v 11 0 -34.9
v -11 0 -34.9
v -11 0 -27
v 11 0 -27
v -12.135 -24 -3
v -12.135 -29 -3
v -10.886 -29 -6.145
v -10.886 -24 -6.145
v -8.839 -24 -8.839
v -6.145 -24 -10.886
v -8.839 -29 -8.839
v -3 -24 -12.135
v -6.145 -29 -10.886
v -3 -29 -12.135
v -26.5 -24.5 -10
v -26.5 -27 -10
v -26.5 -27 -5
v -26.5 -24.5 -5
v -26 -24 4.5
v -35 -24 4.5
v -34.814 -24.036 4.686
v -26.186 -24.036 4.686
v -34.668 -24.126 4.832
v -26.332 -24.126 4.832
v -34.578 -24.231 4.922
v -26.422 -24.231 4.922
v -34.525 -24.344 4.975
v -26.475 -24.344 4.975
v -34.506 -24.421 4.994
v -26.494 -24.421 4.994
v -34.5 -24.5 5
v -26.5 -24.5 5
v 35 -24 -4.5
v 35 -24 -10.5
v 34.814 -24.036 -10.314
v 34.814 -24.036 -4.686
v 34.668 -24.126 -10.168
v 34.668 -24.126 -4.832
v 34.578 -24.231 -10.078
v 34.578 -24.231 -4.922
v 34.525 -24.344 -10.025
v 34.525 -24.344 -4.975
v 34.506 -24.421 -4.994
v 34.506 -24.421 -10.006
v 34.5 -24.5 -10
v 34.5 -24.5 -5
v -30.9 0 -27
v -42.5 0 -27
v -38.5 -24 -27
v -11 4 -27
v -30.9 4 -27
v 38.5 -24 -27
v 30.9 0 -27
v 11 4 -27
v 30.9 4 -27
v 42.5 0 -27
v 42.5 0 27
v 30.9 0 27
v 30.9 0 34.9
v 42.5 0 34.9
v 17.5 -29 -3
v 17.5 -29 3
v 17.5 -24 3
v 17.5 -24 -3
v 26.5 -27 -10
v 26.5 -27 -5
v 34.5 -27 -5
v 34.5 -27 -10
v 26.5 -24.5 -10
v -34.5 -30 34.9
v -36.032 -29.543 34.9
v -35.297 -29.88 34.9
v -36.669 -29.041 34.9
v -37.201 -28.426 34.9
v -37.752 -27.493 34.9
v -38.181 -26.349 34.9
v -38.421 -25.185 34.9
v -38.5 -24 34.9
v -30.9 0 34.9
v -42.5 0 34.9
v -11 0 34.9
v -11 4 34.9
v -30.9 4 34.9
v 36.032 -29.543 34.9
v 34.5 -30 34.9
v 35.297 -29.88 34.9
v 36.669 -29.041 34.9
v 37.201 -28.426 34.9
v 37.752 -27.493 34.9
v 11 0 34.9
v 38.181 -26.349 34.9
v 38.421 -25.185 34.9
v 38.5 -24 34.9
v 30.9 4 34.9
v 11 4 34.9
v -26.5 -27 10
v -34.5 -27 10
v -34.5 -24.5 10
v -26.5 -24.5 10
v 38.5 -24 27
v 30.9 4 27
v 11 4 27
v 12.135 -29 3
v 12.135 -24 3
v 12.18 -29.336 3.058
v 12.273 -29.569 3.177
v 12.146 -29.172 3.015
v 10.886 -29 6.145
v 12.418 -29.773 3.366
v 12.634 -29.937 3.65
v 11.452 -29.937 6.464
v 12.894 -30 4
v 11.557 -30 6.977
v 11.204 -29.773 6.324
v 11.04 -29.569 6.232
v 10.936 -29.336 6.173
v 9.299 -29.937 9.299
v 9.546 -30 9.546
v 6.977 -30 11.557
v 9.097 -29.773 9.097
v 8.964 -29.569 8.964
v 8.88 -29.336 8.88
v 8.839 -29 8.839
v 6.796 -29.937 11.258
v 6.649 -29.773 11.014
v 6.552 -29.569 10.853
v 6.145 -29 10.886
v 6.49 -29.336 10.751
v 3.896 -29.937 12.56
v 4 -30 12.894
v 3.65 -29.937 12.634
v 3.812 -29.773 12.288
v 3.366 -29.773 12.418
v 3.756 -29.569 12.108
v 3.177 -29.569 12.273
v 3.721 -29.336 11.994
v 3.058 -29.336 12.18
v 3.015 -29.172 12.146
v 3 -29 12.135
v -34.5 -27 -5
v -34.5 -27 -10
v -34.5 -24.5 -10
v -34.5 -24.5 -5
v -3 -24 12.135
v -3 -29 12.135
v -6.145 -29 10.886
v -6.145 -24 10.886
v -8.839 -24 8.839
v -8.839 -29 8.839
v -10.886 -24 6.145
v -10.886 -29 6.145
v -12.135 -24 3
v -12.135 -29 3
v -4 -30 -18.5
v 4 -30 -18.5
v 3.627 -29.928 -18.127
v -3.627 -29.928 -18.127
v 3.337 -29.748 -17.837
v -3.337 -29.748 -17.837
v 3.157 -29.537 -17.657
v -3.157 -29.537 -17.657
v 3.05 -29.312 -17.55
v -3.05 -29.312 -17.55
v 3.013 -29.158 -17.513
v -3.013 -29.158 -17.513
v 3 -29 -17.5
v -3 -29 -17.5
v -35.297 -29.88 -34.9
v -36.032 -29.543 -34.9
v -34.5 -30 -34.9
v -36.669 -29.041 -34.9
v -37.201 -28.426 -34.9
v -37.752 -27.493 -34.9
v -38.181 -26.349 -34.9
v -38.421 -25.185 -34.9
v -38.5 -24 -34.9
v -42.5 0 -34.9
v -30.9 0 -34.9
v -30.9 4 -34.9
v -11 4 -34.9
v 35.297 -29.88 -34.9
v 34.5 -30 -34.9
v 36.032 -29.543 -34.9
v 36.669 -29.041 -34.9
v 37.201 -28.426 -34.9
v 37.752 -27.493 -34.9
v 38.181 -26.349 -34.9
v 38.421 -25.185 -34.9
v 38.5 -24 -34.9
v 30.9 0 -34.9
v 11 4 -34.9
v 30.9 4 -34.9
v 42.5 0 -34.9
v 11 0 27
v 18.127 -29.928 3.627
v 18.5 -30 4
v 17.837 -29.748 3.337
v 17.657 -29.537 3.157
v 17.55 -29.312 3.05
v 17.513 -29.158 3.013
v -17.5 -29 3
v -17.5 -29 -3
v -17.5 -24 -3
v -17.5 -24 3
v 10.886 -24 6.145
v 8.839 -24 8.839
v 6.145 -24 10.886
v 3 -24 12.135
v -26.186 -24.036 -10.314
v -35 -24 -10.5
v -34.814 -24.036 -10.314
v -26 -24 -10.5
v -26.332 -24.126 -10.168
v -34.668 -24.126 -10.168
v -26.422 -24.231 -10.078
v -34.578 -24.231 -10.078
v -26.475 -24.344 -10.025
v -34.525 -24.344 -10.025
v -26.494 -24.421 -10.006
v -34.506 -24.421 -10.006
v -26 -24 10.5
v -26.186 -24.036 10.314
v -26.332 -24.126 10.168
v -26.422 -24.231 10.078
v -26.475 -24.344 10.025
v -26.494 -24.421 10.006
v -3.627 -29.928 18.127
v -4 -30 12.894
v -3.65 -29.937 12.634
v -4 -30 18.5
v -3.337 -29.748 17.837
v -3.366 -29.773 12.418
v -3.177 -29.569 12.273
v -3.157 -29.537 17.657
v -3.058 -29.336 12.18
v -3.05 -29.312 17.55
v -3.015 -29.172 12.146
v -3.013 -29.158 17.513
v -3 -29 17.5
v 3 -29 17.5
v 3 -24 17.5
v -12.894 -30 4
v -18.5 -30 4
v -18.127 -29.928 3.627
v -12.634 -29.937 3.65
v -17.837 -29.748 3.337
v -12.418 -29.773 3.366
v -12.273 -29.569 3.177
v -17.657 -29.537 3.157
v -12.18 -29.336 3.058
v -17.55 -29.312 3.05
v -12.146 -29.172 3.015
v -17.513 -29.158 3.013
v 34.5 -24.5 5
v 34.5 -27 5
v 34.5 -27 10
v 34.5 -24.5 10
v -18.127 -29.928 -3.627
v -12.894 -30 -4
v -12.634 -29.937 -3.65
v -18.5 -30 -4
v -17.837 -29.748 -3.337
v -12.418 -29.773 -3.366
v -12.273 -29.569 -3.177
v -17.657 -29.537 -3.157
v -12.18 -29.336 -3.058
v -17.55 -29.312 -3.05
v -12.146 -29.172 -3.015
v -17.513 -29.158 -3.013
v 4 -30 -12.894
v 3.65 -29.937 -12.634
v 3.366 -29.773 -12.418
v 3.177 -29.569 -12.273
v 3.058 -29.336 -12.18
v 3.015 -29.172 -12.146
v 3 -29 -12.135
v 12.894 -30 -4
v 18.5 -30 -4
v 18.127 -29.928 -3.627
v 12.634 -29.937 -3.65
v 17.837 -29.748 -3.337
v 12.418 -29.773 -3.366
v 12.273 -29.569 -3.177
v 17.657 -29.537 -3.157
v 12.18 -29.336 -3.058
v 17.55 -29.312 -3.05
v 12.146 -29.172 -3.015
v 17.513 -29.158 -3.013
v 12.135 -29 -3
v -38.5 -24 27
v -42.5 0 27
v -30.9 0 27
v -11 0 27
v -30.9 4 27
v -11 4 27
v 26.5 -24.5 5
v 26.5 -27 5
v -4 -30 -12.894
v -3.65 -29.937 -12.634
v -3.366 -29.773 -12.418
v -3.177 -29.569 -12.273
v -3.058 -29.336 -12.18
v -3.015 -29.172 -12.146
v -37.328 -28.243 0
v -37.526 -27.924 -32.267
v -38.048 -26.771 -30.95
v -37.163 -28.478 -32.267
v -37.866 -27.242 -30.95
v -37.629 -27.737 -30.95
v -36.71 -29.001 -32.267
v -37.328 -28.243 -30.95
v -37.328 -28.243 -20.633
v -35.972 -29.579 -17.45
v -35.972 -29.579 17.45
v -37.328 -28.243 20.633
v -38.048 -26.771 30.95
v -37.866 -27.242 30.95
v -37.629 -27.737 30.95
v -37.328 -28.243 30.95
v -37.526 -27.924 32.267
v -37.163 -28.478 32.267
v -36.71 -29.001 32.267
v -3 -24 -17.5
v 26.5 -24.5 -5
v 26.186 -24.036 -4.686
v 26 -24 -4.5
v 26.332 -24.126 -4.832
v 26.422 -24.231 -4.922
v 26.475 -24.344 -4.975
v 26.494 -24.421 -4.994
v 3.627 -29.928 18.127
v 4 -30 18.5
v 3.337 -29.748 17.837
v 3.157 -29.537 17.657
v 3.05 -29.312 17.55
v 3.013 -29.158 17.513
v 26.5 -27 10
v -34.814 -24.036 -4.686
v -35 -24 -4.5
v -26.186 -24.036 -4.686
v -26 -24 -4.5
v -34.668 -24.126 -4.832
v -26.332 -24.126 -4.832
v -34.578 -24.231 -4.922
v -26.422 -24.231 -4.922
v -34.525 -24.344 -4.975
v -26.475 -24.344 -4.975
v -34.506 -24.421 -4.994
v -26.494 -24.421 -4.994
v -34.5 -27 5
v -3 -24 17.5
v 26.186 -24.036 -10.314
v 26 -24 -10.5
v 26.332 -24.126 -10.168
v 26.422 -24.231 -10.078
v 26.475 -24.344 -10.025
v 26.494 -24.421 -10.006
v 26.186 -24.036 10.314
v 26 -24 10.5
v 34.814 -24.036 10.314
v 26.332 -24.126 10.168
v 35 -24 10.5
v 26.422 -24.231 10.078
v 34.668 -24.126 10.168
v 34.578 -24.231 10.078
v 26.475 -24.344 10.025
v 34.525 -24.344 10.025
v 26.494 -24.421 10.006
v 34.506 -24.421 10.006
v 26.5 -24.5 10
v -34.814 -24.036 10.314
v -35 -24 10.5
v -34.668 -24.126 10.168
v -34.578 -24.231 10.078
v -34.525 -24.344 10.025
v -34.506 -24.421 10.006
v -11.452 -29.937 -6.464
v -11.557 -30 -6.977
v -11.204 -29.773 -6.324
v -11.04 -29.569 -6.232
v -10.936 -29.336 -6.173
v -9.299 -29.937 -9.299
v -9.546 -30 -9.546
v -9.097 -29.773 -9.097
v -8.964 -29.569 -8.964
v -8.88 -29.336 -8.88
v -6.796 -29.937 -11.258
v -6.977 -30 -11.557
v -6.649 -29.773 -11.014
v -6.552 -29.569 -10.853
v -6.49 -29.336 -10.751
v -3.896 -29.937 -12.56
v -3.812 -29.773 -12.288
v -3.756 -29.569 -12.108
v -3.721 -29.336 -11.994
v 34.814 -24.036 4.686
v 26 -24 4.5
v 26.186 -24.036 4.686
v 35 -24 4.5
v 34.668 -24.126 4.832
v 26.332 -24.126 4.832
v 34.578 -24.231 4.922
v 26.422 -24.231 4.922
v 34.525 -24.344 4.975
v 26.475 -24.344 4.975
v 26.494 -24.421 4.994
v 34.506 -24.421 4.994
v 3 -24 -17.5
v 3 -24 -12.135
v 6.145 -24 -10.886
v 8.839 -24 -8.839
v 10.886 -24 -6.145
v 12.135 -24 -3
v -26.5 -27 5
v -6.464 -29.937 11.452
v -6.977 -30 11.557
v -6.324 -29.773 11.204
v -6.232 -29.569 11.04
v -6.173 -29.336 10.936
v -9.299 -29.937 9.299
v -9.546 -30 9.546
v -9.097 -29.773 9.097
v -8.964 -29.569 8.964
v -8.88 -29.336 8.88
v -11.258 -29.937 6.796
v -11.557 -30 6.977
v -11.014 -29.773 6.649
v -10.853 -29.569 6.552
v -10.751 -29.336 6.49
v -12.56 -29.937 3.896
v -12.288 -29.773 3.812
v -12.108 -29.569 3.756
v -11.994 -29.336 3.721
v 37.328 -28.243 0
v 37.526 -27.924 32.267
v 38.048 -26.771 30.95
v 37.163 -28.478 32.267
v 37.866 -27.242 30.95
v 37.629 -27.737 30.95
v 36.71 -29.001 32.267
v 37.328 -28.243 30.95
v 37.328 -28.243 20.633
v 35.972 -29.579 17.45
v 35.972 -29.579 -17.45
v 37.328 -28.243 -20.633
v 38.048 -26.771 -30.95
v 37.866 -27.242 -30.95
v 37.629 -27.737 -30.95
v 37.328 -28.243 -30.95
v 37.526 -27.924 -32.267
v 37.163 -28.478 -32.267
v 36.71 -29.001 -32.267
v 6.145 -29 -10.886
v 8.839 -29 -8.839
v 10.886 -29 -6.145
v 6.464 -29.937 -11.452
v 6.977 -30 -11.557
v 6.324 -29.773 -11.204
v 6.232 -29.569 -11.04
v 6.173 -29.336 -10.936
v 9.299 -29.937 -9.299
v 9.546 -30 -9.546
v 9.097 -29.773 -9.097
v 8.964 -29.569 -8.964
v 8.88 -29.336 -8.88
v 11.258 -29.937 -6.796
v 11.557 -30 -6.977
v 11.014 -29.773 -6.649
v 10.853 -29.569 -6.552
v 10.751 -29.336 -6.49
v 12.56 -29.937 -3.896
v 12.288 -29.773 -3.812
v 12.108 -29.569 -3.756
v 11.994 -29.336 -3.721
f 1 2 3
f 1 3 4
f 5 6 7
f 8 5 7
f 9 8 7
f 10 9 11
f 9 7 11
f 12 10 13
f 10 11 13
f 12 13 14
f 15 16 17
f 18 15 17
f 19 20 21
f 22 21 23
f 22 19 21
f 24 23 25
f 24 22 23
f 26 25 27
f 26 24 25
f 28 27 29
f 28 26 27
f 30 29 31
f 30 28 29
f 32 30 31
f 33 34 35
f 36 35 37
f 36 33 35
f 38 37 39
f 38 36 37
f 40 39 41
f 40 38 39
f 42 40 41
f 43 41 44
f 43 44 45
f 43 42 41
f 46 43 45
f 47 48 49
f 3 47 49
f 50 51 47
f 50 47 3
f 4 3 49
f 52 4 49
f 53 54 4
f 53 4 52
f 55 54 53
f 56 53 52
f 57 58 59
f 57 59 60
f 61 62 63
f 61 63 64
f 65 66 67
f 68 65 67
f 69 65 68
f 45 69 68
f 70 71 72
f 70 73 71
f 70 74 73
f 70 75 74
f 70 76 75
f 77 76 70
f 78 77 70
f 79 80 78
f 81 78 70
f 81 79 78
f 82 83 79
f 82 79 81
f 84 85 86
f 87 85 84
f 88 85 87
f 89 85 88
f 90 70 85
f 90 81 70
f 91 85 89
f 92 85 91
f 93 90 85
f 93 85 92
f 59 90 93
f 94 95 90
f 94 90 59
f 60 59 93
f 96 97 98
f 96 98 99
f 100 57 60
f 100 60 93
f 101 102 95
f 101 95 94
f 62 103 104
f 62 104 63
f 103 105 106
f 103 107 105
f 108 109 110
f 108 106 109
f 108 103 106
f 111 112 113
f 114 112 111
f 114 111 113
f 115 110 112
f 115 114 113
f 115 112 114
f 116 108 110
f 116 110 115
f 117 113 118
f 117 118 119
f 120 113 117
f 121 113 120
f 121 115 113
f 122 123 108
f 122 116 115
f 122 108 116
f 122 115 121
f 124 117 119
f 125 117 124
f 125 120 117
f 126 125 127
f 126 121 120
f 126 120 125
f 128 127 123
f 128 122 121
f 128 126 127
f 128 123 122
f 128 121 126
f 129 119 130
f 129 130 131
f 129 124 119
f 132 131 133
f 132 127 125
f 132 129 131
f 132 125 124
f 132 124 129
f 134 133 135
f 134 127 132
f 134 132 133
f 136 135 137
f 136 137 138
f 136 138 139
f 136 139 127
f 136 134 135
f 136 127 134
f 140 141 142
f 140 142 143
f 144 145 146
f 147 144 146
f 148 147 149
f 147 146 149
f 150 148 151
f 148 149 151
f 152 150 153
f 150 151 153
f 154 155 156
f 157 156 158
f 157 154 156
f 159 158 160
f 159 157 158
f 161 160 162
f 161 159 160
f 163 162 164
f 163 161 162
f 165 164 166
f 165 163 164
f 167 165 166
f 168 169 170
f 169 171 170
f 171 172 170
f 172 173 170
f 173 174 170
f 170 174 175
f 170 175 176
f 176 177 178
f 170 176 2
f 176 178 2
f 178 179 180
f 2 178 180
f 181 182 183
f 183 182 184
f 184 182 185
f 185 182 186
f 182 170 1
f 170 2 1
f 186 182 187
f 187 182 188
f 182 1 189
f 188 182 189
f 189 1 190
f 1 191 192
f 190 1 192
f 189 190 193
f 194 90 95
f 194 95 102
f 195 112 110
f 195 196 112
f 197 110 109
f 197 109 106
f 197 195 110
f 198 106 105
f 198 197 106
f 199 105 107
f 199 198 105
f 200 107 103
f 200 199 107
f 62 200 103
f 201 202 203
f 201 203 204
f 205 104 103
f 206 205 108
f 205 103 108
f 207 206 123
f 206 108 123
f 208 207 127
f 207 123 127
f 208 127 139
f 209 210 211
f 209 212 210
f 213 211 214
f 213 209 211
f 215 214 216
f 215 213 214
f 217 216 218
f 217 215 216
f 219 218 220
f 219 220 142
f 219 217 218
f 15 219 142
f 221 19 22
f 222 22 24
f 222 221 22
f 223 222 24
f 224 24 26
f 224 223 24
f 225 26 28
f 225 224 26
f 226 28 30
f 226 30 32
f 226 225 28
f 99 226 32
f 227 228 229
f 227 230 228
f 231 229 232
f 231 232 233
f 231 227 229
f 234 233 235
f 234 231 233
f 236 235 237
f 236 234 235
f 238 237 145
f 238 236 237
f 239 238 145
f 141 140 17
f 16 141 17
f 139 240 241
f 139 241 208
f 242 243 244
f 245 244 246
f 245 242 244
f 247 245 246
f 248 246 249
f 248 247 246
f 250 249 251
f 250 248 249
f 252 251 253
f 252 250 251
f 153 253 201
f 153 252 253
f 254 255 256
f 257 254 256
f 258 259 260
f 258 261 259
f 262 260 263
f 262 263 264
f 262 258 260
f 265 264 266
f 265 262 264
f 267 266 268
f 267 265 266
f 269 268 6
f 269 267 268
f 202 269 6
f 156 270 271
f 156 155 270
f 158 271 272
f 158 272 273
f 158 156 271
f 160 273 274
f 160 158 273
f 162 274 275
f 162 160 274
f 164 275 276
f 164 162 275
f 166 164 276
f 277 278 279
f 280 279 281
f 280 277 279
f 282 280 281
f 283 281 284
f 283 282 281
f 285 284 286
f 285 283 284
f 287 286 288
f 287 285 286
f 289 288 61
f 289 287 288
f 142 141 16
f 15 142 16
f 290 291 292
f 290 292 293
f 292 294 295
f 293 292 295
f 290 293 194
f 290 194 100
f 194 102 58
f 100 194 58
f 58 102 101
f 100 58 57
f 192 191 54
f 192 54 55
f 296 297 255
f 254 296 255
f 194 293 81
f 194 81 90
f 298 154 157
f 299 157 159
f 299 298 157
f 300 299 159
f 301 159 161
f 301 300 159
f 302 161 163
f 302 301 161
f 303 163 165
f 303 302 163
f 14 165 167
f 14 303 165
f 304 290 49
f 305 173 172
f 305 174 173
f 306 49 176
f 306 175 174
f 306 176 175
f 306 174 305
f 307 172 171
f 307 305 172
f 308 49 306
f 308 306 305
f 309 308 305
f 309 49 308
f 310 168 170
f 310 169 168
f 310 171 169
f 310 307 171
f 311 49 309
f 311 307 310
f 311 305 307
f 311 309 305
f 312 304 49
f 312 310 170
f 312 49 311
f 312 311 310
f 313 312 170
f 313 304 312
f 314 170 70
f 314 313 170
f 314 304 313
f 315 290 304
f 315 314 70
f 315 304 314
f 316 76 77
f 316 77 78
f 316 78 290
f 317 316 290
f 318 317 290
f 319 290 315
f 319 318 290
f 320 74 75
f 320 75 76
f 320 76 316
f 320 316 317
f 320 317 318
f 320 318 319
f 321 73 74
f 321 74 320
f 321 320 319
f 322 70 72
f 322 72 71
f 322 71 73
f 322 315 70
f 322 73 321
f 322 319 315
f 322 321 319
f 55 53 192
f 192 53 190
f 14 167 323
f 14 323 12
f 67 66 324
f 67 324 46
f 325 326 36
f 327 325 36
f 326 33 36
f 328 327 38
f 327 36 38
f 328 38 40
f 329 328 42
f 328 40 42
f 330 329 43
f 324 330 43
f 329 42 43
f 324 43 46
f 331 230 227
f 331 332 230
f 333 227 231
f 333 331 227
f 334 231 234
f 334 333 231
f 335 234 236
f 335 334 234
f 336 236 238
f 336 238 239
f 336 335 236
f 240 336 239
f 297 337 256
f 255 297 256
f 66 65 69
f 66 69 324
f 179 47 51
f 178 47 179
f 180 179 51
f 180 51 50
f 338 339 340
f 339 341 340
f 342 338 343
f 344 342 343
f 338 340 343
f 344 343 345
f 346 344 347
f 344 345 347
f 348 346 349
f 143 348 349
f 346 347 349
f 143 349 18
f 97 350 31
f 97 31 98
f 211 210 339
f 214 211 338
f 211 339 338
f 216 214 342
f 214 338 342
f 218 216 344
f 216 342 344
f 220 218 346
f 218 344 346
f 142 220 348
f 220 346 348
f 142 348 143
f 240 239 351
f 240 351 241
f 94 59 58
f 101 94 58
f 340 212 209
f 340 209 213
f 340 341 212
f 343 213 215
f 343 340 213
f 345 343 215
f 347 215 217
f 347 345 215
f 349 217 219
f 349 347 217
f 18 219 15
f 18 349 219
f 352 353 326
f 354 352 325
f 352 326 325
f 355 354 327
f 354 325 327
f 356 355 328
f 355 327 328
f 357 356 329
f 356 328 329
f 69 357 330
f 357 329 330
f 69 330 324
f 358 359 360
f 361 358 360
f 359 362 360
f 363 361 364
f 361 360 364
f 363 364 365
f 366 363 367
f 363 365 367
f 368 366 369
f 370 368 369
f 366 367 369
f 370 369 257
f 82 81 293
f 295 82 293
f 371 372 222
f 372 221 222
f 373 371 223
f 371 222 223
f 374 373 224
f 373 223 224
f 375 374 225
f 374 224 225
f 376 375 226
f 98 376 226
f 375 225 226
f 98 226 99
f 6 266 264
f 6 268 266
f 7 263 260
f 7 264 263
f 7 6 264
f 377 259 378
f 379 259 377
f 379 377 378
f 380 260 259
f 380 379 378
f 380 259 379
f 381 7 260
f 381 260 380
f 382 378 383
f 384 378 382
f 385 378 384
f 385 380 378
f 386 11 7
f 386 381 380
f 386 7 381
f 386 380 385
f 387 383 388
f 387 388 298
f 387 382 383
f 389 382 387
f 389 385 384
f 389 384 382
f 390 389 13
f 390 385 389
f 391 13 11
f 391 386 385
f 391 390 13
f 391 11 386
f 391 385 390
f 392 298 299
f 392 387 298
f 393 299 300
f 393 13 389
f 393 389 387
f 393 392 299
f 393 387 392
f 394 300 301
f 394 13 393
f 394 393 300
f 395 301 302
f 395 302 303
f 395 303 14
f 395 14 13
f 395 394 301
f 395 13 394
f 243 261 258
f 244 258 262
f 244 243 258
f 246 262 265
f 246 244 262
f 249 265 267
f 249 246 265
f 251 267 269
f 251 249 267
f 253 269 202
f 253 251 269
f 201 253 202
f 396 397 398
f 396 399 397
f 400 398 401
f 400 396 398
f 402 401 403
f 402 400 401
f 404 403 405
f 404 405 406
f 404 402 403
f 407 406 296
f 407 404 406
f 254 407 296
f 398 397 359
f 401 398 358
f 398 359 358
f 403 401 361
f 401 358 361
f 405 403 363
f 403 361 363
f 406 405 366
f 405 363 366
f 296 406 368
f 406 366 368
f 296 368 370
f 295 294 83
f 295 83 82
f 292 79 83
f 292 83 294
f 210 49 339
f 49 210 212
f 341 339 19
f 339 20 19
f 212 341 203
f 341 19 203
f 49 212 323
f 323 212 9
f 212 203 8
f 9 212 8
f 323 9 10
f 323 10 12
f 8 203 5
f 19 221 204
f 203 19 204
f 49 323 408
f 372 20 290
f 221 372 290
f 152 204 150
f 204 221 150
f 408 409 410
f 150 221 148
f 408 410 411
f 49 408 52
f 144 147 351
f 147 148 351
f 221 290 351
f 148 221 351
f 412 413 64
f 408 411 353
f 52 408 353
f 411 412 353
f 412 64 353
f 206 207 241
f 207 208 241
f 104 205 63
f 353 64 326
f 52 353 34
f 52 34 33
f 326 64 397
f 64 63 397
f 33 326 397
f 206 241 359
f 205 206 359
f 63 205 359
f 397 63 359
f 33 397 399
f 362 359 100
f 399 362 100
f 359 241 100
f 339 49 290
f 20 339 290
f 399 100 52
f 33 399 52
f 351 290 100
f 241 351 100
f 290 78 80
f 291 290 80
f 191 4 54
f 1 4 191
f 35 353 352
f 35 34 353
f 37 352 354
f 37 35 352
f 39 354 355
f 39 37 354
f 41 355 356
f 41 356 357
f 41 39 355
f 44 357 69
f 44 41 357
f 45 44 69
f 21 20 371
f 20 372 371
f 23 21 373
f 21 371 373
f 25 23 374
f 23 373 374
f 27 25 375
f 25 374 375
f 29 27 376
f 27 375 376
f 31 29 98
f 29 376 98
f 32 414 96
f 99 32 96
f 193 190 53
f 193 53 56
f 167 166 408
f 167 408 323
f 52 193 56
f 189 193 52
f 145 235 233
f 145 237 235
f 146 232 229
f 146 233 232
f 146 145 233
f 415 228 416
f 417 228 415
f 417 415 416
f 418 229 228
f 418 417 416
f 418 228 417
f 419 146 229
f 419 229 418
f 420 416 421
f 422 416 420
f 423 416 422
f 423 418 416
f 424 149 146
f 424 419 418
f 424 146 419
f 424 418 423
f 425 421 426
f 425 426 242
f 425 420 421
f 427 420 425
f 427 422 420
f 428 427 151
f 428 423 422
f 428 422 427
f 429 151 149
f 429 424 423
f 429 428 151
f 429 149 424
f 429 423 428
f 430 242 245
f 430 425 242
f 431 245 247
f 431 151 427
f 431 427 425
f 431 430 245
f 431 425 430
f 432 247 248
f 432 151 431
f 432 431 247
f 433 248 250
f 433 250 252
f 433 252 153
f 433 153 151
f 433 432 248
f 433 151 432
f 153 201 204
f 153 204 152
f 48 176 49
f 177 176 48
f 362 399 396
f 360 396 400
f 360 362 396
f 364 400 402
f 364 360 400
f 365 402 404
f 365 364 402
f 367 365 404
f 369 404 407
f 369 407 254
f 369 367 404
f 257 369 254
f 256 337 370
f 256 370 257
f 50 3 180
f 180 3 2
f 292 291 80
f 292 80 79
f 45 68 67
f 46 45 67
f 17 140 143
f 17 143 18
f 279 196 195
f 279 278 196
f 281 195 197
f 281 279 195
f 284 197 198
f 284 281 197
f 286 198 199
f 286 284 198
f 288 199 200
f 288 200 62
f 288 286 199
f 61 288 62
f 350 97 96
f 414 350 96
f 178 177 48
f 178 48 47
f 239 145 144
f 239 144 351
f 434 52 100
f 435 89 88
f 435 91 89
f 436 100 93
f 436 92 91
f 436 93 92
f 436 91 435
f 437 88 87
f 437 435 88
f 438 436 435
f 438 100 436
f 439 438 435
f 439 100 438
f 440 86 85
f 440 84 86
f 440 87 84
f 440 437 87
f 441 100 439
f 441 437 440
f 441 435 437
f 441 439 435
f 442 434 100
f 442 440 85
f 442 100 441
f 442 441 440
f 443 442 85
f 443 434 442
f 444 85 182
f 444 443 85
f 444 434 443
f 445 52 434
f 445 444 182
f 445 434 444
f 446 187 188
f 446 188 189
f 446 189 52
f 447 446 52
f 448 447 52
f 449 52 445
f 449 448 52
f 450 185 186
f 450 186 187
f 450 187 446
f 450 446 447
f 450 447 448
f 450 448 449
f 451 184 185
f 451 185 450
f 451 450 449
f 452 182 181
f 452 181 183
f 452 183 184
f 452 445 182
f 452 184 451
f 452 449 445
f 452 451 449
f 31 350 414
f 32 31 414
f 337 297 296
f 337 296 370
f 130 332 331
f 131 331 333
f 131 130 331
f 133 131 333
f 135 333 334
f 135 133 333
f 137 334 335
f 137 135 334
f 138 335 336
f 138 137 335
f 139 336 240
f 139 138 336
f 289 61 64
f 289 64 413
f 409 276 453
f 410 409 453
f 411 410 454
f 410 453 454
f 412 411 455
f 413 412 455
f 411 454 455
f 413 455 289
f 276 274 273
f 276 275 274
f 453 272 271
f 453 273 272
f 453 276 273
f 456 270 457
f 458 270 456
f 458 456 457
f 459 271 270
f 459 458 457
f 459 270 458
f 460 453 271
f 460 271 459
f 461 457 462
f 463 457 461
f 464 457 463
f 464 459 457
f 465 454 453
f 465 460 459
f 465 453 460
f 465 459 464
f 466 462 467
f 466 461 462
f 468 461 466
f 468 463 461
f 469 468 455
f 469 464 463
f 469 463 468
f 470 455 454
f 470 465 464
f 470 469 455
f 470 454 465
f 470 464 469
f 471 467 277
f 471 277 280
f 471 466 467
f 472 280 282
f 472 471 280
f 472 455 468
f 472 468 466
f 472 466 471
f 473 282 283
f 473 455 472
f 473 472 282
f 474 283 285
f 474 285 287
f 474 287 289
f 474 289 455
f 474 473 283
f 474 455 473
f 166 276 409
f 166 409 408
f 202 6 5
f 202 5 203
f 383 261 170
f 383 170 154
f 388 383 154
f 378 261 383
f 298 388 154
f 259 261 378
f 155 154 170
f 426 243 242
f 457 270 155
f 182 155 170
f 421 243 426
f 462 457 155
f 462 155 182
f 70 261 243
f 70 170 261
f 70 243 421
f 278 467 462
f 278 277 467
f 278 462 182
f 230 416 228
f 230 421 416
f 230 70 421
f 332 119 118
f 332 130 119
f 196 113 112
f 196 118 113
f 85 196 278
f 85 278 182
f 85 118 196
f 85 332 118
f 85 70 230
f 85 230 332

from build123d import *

# Parameters (mm, degrees)
SKETCH1_W             = 19.9
SKETCH1_H             = 7.9
BOSS_EXTRUDE1_DEPTH   = 4
BOSS_EXTRUDE1_2_DEPTH = 4
BOSS_EXTRUDE1_3_DEPTH = 4
BOSS_EXTRUDE1_4_DEPTH = 4
SKETCH2_W             = 85
SKETCH2_H             = 7.9
BOSS_EXTRUDE2_DEPTH   = 24
CHAMFER1_START        = -36
CHAMFER1_DEPTH        = 10
CHAMFER2_SIZE         = 24
CHAMFER2_SIZE_2       = 4
SKETCH4_W             = 77
SKETCH4_H             = 69.8
BOSS_EXTRUDE3_DEPTH   = 6
FILLET1_SIZE          = 6
FILLET1_SIZE_2        = 4
SKETCH7_W             = 8
SKETCH7_H             = 5
CUT_EXTRUDE3_DEPTH    = 65.654930379
SKETCH8_W             = 8
SKETCH8_H             = 20
BOSS_EXTRUDE4_DEPTH   = 3
SKETCH9_R             = 12.5
CUT_EXTRUDE4_DEPTH    = 65.654930379
CUT_EXTRUDE5_DEPTH    = 65.654930379
FILLET2_R             = 1
FILLET3_R             = 0.5


with BuildPart() as part:
    # Sketch1 → Boss-Extrude1 (new body)
    with BuildSketch(Plane(origin=(0, 0, 0), x_dir=(1, 0, 0), z_dir=(0, 1, 0))):
        with Locations((20.95, 30.95)):
            Rectangle(SKETCH1_W, SKETCH1_H)
    extrude(amount=BOSS_EXTRUDE1_DEPTH)



with BuildPart() as body_2:
    # Sketch1 → Boss-Extrude1 2 (new body)
    with BuildSketch(Plane(origin=(0, 0, 0), x_dir=(1, 0, 0), z_dir=(0, 1, 0))):
        with Locations((-20.95, -30.95)):
            Rectangle(SKETCH1_W, SKETCH1_H)
    extrude(amount=BOSS_EXTRUDE1_2_DEPTH)


with BuildPart() as body_3:
    # Sketch1 → Boss-Extrude1 3 (new body)
    with BuildSketch(Plane(origin=(0, 0, 0), x_dir=(1, 0, 0), z_dir=(0, 1, 0))):
        with Locations((20.95, -30.95)):
            Rectangle(SKETCH1_W, SKETCH1_H)
    extrude(amount=BOSS_EXTRUDE1_3_DEPTH)


with BuildPart() as body_4:
    # Sketch1 → Boss-Extrude1 4 (new body)
    with BuildSketch(Plane(origin=(0, 0, 0), x_dir=(1, 0, 0), z_dir=(0, 1, 0))):
        with Locations((-20.95, 30.95)):
            Rectangle(SKETCH1_W, SKETCH1_H)
    extrude(amount=BOSS_EXTRUDE1_4_DEPTH)


with BuildPart() as part_1:
    add(part.part)

    add(body_2.part)  # Boss-Extrude2 merges body 2

    add(body_3.part)  # Boss-Extrude2 merges body 3

    add(body_4.part)  # Boss-Extrude2 merges body 4
    # Sketch2 → Boss-Extrude2 (add)
    with BuildSketch(Plane(origin=(0, 0, 0), x_dir=(1, 0, 0), z_dir=(0, 1, 0))):
        with Locations((0, 30.95)):
            Rectangle(SKETCH2_W, SKETCH2_H)
        with Locations((0, -30.95)):
            Rectangle(SKETCH2_W, SKETCH2_H)
    extrude(amount=-BOSS_EXTRUDE2_DEPTH)

    # Chamfer1: read off the stored shape, not the designer's step
    # Chamfer1 outline → Chamfer1 (cut)
    with BuildSketch(Plane.XY.offset(CHAMFER1_START)):
        Polygon((-42.5, -24), (-38.5, -24), (-42.5, 0), align=None)
        Polygon((42.5, 0), (38.5, -24), (42.5, -24), align=None)
    extrude(amount=CHAMFER1_DEPTH, mode=Mode.SUBTRACT)

    # Chamfer2
    # the kernel refuses this chamfer: 24, 4 mm, written as the material it takes off along each edge
    with BuildSketch(Plane(origin=(42.5, -24, -35.368593459), x_dir=(0, 1, 0), z_dir=(0, 0, 1))) as chamfer2_piece_1:
        Polygon((CHAMFER2_SIZE, 0), (0, CHAMFER2_SIZE_2), (0, 0), align=None)
    extrude(amount=132.637186918, mode=Mode.SUBTRACT)
    with BuildSketch(Plane(origin=(-42.5, -24, 97.268593459), x_dir=(1, 0, 0), z_dir=(0, 0, -1))) as chamfer2_piece_2:
        Polygon((CHAMFER2_SIZE_2, 0), (0, -CHAMFER2_SIZE), (0, 0), align=None)
    extrude(amount=132.637186918, mode=Mode.SUBTRACT)

    # Sketch4 → Boss-Extrude3 (add)
    with BuildSketch(Plane.XZ.offset(24)):
        Rectangle(SKETCH4_W, SKETCH4_H)
    extrude(amount=BOSS_EXTRUDE3_DEPTH)

    # Fillet1
    # a fillet whose section is not a circle: 6, 4 mm, written as the material it takes off along each edge
    with BuildSketch(Plane(origin=(38.5, -30, -49.9), x_dir=(0, 1, 0), z_dir=(0, 0, 1)), Plane(origin=(-38.5, -30, 49.9), x_dir=(0, 1, 0), z_dir=(0, 0, -1))) as fillet1_piece_1:
        with BuildLine():
            Bezier((FILLET1_SIZE, 0), (0, 0), (0, FILLET1_SIZE_2), weights=[1, 0.707106781, 1])
            Line((0, FILLET1_SIZE_2), (0, 0))
            Line((0, 0), (FILLET1_SIZE, 0))
        make_face()
    extrude(amount=99.8, mode=Mode.SUBTRACT)

    # Sketch7 → Cut-Extrude3 (cut, through all)
    with BuildSketch(Plane.XZ.offset(30)):
        with Locations((-30.5, -7.5)):
            Rectangle(SKETCH7_W, SKETCH7_H)
        with Locations((-30.5, 7.5)):
            Rectangle(SKETCH7_W, SKETCH7_H)
        with Locations((30.5, 7.5)):
            Rectangle(SKETCH7_W, SKETCH7_H)
        with Locations((30.5, -7.5)):
            Rectangle(SKETCH7_W, SKETCH7_H)
    extrude(amount=-CUT_EXTRUDE3_DEPTH, mode=Mode.SUBTRACT)

    # Sketch8 → Boss-Extrude4 (add)
    with BuildSketch(Plane.XZ.offset(30)):
        with Locations((-30.5, 0)):
            Rectangle(SKETCH8_W, SKETCH8_H)
        with Locations((30.5, 0)):
            Rectangle(SKETCH8_W, SKETCH8_H)
    extrude(amount=-BOSS_EXTRUDE4_DEPTH)

    # Sketch9 → Cut-Extrude4 (cut, through all)
    with BuildSketch(Plane.XZ.offset(30)):
        with Locations(Location((0, 0, 0), (0, 0, 270))):
            Circle(SKETCH9_R)
    extrude(amount=-CUT_EXTRUDE4_DEPTH, mode=Mode.SUBTRACT)

    # Sketch10 → Cut-Extrude5 (cut, through all)
    with BuildSketch(Plane.XZ.offset(30)):
        Polygon((3, 3), (17.5, 3), (17.5, -3), (3, -3), (3, -17.5), (-3, -17.5), (-3, -3), (-17.5, -3), (-17.5, 3), (-3, 3), (-3, 17.5), (3, 17.5), align=None)
    extrude(amount=-CUT_EXTRUDE5_DEPTH, mode=Mode.SUBTRACT)

    # Fillet2
    fillet2_edges = [part_1.edges().sort_by_distance(p)[0] for p in [
        (8.838834765, -30, -8.838834765),
        (8.838834765, -30, 8.838834765),
        (-8.838834765, -30, 8.838834765),
        (-8.838834765, -30, -8.838834765),
        (-17.5, -30, 0),
        (-14.81733055, -30, -3),
        (0, -30, -17.5),
        (3, -30, -14.81733055),
        (14.81733055, -30, -3),
        (3, -30, 14.81733055),
        (-3, -30, -14.81733055),
        (-14.81733055, -30, 3),
        (-3, -30, 14.81733055),
        (0, -30, 17.5),
        (14.81733055, -30, 3),
        (17.5, -30, 0),
    ]]
    fillet(fillet2_edges, radius=FILLET2_R)

    # Fillet3
    fillet3_edges = [part_1.edges().sort_by_distance(p)[0] for p in [
        (26.5, -24, 7.5),
        (30.5, -24, 5),
        (30.5, -24, 10),
        (34.5, -24, 7.5),
        (26.5, -24, -7.5),
        (30.5, -24, -10),
        (30.5, -24, -5),
        (34.5, -24, -7.5),
        (-30.5, -24, -10),
        (-34.5, -24, -7.5),
        (-30.5, -24, -5),
        (-26.5, -24, -7.5),
        (-26.5, -24, 7.5),
        (-34.5, -24, 7.5),
        (-30.5, -24, 10),
        (-30.5, -24, 5),
    ]]
    fillet(fillet3_edges, radius=FILLET3_R)


solid = part_1.part
